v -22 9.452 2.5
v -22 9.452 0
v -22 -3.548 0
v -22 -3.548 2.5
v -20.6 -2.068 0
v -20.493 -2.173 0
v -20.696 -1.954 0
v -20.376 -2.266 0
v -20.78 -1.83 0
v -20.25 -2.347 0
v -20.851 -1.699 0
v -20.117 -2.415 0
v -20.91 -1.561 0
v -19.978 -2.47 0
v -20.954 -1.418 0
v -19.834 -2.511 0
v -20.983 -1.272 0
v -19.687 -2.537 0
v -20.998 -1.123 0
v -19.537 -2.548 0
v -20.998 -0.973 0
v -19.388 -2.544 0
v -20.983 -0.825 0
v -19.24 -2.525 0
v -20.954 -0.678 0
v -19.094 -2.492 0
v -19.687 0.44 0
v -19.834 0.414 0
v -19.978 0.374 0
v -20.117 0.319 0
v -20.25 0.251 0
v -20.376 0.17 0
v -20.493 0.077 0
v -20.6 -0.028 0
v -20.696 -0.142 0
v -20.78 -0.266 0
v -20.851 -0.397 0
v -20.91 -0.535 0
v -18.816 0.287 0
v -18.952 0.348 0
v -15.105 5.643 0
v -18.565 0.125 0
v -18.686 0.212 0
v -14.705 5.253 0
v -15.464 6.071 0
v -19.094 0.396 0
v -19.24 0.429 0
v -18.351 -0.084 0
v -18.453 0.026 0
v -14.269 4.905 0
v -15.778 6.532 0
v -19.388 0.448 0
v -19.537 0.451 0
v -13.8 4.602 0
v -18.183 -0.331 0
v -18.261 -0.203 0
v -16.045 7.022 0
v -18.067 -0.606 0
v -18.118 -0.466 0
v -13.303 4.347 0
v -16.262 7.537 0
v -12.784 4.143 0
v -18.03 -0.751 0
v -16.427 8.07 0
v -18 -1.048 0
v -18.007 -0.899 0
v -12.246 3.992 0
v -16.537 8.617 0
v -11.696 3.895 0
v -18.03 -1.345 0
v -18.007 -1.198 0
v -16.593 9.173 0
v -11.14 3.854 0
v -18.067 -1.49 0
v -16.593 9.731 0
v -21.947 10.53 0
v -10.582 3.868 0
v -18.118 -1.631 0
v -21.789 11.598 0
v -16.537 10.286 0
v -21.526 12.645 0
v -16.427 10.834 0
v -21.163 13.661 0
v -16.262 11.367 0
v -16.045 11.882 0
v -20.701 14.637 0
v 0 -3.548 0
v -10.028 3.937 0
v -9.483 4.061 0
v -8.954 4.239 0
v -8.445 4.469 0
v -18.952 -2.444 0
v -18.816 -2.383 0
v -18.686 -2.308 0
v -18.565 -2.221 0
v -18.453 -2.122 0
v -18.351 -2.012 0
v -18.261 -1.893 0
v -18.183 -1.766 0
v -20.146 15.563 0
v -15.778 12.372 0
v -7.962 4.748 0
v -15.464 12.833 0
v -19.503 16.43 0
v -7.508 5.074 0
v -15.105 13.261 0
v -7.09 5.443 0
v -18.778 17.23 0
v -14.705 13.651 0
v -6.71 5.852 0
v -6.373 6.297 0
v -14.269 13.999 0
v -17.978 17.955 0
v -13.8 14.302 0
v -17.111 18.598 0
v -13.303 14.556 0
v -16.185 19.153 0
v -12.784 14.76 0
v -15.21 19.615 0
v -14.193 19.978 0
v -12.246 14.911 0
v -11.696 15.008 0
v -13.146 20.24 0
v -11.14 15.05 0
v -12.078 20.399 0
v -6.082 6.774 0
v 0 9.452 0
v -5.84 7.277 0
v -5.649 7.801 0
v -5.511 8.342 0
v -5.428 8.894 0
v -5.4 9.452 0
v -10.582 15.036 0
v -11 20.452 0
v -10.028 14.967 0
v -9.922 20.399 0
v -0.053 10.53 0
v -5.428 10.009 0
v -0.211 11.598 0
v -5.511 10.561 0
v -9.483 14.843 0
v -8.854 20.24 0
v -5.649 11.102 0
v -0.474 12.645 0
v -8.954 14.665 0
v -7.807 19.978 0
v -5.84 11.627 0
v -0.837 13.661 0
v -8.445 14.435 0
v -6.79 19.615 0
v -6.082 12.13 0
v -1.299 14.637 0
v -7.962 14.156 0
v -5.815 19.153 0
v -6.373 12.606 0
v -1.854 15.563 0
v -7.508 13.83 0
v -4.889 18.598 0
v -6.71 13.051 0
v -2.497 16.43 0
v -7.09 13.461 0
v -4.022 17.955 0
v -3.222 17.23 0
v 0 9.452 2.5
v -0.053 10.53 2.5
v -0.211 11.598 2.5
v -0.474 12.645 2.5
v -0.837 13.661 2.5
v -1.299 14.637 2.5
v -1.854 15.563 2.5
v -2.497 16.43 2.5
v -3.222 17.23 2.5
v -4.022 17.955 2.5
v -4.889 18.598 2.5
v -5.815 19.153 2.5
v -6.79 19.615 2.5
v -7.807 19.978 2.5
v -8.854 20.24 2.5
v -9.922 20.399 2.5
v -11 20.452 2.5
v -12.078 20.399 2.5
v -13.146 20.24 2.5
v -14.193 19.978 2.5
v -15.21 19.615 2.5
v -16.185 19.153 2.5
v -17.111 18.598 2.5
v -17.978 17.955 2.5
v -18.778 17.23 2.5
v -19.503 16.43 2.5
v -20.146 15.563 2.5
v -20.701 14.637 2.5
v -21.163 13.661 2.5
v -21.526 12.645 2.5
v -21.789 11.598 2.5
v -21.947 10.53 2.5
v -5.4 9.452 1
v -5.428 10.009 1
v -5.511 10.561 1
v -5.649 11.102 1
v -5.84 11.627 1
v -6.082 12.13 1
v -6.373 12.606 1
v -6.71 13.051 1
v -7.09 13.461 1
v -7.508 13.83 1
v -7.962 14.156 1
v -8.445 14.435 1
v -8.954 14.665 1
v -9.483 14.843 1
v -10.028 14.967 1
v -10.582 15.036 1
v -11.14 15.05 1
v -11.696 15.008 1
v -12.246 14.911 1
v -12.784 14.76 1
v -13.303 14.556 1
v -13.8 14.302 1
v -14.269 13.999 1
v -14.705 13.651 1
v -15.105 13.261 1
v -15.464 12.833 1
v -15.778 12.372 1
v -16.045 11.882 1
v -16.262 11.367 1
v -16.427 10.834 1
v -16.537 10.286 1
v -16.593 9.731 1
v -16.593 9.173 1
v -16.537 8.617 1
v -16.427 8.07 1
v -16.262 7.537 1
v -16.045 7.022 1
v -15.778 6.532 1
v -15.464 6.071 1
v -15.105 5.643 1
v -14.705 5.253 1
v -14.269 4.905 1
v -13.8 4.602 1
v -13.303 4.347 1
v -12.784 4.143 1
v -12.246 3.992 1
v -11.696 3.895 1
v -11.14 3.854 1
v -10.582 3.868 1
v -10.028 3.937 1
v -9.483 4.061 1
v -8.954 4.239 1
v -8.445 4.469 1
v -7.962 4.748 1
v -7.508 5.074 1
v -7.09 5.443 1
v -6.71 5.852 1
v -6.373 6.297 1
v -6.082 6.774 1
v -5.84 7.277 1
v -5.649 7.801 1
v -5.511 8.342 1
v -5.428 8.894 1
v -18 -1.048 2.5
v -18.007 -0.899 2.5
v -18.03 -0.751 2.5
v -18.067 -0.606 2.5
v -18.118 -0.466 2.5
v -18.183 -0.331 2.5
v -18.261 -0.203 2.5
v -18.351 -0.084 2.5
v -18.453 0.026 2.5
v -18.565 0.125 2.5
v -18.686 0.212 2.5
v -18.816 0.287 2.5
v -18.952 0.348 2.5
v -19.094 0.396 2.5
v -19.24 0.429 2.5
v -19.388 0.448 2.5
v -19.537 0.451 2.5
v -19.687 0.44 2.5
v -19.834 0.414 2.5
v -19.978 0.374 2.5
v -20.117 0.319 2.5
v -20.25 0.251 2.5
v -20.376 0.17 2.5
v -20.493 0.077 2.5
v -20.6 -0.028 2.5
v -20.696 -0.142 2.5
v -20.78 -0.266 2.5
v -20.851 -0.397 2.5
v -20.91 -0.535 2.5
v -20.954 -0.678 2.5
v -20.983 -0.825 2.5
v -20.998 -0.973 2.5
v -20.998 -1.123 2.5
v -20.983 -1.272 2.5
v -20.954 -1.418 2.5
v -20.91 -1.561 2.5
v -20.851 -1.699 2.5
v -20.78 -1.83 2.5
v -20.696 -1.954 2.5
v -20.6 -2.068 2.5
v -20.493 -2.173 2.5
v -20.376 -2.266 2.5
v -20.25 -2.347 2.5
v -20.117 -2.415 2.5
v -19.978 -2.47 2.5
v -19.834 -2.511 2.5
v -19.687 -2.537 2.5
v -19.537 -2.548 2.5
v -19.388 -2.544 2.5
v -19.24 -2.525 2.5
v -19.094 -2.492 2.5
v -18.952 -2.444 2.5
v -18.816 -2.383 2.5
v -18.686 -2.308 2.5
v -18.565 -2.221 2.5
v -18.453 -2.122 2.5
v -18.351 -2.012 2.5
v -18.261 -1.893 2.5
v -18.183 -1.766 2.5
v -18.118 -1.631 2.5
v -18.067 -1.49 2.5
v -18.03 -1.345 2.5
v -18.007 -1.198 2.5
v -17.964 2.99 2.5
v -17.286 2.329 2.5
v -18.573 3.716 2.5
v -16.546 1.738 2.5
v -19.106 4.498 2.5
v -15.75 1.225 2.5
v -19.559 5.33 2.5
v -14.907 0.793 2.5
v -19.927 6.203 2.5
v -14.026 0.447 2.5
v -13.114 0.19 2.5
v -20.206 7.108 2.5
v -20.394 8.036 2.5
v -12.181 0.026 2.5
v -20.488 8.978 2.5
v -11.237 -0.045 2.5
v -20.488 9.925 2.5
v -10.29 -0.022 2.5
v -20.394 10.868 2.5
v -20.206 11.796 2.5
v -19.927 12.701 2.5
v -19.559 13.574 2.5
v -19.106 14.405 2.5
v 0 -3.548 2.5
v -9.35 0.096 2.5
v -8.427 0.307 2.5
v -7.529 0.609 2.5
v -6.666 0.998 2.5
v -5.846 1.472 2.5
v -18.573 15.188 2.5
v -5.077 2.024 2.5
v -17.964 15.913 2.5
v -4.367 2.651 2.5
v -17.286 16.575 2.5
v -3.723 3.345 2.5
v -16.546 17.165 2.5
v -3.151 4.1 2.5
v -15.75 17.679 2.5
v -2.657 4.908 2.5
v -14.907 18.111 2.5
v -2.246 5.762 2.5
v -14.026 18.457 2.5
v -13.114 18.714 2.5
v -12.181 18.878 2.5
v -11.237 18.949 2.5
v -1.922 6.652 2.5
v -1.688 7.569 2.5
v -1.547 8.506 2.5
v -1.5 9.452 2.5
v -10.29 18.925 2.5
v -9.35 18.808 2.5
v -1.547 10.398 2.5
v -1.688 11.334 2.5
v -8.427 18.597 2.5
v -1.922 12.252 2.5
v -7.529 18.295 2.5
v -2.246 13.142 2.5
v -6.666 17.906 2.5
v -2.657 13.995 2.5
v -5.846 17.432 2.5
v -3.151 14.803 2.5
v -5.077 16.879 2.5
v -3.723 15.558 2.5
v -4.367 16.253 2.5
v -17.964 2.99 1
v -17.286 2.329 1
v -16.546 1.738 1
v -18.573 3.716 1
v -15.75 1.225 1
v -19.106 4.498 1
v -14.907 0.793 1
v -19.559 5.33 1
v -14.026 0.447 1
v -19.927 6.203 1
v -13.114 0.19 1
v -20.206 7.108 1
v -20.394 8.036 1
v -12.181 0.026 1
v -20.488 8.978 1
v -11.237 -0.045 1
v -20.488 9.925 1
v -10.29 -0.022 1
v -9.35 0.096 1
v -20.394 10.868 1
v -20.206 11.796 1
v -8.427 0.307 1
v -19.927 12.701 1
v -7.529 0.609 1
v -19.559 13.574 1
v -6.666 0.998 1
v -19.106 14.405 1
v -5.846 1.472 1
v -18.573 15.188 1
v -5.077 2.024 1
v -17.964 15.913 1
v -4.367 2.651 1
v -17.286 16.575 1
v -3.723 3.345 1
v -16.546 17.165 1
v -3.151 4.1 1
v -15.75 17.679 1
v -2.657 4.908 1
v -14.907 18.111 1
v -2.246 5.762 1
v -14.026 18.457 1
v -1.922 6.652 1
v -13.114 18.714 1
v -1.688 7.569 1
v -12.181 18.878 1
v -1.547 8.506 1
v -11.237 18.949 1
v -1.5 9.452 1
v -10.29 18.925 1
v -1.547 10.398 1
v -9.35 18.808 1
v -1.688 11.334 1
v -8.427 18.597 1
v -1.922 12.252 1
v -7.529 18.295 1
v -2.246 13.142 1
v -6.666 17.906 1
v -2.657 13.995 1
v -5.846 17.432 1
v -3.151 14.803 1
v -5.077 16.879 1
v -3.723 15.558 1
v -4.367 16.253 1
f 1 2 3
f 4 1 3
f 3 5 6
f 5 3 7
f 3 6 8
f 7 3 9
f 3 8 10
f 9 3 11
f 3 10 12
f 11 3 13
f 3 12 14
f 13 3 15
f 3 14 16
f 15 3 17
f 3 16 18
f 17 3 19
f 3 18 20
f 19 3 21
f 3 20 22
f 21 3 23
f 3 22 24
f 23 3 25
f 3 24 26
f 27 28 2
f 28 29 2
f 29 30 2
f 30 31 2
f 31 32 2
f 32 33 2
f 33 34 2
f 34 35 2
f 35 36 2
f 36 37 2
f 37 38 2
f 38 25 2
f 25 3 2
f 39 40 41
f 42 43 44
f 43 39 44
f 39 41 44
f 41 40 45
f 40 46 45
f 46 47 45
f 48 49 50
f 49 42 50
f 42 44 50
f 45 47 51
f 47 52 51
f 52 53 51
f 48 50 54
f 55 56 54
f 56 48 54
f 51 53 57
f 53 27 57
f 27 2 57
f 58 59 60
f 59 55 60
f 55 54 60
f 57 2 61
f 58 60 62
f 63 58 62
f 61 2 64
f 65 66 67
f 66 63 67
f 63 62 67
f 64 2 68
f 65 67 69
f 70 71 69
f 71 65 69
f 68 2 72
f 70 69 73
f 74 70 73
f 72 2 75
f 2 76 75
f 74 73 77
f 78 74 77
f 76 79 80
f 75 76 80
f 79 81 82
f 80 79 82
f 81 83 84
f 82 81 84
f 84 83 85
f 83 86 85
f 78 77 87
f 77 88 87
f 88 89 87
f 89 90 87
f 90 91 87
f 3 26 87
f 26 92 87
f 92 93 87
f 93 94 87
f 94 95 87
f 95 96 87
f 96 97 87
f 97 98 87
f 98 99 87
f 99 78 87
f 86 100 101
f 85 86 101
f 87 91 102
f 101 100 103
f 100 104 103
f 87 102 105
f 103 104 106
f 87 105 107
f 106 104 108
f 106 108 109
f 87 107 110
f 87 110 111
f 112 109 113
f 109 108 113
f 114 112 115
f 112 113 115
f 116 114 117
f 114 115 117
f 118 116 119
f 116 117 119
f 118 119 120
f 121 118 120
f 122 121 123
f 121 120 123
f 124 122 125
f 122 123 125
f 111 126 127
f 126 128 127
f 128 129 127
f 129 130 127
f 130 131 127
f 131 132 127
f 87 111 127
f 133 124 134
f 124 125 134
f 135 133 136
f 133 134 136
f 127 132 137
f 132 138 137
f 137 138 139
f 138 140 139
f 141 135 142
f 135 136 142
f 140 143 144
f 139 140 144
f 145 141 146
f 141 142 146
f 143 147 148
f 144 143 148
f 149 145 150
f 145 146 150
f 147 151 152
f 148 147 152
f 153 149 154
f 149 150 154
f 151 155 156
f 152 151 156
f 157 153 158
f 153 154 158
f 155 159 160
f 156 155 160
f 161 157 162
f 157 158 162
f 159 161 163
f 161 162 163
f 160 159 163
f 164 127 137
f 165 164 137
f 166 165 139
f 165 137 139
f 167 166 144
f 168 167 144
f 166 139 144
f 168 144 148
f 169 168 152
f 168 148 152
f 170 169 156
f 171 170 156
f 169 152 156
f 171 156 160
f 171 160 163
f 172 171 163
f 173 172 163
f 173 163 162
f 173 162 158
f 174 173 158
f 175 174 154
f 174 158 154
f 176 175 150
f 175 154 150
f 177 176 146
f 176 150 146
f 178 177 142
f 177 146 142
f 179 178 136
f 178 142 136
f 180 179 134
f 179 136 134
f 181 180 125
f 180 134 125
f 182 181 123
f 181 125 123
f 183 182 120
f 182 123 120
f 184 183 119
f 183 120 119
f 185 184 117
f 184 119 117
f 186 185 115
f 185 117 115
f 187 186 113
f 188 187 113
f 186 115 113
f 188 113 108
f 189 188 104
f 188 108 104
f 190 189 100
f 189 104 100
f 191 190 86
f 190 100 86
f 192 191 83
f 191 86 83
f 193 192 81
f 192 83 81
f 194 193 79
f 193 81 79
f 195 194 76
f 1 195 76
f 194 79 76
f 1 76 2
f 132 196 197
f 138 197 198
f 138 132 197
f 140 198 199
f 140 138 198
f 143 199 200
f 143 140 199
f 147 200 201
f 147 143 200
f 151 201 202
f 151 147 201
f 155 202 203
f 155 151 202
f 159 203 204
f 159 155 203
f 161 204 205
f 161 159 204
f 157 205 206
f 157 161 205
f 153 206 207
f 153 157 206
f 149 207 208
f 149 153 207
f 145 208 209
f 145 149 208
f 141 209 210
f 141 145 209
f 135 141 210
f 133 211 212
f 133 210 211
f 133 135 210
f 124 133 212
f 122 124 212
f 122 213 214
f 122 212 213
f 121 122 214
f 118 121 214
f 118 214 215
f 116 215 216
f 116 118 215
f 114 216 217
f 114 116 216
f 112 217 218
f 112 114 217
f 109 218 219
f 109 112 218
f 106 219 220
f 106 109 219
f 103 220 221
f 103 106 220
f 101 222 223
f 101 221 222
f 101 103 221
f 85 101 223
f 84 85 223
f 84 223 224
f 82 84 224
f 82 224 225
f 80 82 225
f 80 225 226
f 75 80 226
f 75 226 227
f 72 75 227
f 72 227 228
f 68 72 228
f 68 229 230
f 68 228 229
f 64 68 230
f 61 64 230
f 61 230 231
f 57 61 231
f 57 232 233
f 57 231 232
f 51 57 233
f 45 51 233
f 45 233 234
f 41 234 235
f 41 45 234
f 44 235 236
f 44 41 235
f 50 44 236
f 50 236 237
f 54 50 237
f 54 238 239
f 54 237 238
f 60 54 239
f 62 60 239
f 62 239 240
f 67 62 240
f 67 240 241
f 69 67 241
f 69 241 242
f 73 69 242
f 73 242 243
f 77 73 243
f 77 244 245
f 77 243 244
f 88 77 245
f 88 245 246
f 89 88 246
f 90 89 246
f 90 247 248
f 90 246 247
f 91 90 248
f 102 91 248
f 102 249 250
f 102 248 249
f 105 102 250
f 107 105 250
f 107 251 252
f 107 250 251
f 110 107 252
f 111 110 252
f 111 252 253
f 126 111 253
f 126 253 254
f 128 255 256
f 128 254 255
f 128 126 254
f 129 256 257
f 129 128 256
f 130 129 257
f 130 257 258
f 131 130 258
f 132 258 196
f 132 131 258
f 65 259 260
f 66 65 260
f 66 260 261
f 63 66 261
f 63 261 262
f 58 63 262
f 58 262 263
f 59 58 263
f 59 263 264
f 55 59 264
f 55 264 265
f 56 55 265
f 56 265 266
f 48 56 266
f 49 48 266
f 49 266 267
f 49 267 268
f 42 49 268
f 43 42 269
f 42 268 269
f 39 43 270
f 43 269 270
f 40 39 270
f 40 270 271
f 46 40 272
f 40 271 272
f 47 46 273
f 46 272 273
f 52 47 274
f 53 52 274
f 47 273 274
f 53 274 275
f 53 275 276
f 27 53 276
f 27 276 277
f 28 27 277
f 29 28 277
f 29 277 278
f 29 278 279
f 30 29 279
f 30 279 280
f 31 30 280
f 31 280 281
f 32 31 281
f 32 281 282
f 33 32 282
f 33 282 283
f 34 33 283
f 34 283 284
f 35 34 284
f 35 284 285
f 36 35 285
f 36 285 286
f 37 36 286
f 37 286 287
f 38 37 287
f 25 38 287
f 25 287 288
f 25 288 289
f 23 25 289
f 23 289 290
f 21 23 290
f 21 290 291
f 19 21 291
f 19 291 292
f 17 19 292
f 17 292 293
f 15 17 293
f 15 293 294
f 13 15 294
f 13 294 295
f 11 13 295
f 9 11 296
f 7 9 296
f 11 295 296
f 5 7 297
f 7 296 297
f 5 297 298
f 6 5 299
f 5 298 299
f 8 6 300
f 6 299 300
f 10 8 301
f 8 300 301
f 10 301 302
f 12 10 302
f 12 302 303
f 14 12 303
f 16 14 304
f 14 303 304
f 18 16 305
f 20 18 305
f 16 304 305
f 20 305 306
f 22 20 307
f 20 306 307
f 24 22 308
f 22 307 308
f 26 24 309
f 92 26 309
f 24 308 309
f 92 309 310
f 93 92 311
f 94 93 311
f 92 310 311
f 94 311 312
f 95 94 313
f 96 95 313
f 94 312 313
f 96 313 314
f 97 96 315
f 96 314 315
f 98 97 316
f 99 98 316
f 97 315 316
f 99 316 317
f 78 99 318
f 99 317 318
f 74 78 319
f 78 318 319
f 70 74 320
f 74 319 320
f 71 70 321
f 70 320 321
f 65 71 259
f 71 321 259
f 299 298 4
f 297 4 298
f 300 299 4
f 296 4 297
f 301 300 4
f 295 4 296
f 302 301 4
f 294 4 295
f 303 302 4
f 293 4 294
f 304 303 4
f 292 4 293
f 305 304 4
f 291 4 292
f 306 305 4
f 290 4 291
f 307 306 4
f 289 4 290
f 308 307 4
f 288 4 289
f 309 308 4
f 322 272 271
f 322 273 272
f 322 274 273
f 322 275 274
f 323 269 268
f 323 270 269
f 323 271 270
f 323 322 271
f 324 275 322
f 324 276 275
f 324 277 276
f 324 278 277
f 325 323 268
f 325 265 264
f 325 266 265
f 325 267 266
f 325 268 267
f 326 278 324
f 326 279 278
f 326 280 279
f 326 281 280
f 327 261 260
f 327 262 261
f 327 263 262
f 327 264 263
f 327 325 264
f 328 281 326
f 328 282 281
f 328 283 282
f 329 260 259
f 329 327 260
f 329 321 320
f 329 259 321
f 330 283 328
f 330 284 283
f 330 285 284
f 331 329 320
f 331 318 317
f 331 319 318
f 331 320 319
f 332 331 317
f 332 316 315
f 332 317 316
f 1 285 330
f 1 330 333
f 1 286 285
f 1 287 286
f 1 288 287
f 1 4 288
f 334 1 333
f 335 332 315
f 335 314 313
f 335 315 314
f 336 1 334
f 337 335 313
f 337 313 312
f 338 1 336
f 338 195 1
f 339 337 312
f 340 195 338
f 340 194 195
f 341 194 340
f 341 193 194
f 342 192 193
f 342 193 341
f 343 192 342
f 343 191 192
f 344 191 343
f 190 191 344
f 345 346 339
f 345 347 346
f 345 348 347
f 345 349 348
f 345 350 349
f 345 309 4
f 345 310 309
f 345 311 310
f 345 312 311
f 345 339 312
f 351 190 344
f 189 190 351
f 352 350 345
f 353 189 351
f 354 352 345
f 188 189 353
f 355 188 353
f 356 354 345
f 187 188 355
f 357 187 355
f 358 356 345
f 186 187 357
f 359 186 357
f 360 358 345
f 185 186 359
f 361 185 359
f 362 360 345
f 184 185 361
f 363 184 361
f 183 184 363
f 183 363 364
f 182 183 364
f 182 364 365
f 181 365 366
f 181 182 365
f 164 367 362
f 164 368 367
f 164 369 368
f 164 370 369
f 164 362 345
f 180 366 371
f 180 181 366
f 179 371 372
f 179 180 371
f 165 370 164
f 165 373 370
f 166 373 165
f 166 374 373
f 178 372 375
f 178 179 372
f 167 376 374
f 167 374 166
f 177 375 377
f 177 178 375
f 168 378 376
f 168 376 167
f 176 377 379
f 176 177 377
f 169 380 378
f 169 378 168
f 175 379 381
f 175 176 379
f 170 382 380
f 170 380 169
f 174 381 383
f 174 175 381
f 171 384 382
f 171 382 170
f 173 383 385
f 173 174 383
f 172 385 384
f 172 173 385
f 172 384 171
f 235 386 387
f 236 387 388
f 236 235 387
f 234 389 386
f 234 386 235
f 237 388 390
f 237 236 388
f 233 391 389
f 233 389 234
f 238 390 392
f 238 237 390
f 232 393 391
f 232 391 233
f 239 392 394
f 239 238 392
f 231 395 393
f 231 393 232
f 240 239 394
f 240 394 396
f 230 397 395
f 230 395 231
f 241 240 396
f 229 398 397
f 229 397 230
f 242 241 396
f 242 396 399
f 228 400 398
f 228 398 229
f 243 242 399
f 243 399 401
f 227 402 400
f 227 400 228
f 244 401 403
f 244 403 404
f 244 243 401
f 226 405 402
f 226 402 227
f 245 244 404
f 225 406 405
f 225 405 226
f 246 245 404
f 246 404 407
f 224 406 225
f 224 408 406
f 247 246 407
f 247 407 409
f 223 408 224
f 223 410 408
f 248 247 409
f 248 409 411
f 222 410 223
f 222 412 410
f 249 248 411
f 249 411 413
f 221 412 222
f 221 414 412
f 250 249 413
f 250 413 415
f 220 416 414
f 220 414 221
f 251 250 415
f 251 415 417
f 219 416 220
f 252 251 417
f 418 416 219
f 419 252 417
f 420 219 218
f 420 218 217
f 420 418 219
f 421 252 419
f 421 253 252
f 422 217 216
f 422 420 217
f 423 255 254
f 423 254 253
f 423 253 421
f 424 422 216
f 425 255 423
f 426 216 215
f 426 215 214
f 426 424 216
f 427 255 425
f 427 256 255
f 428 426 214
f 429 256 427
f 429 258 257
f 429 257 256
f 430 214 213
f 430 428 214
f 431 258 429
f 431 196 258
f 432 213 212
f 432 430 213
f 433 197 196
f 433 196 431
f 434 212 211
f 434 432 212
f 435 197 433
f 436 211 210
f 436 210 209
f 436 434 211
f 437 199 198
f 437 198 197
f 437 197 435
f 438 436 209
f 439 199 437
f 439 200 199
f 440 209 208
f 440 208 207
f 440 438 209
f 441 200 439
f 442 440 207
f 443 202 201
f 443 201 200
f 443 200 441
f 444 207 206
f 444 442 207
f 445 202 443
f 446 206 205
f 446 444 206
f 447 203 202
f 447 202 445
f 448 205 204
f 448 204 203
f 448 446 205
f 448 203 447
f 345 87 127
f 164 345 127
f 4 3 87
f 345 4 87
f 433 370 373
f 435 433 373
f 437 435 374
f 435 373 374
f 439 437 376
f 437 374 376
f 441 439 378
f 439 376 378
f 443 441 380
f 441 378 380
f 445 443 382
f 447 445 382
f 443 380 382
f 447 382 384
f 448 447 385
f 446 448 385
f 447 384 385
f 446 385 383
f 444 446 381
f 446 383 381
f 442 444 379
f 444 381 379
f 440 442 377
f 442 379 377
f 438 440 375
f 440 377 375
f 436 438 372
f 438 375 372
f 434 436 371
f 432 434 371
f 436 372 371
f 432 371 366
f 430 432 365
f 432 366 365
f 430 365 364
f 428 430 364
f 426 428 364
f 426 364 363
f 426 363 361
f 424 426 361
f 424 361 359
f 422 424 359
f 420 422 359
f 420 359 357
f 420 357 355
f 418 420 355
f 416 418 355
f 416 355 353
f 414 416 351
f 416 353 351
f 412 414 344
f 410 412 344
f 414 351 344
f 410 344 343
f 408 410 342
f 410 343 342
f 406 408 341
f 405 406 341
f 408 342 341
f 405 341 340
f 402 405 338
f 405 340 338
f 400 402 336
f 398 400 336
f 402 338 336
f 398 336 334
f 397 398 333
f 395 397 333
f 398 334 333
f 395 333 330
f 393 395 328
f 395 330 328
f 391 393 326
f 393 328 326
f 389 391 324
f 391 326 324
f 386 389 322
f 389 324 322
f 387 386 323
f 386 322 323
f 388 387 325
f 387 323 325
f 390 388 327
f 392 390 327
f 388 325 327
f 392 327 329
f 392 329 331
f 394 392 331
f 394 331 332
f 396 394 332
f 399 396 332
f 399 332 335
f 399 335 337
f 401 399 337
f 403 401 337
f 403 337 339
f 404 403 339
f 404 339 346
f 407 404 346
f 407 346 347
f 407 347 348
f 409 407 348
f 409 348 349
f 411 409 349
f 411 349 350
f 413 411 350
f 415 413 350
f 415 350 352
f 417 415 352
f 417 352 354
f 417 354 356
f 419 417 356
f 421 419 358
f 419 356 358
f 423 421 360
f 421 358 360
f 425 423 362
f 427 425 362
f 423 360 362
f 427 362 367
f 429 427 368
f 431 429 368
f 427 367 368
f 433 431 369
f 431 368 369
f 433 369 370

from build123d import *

# Parameters (mm, degrees)
ESQUISSE1_R      = 5.6
EXTRUSION1_DEPTH = 2.5
ESQUISSE2_R      = 9.5
EXTRUSION2_DEPTH = 1.5
ESQUISSE3_R      = 1.5
EXTRUSION3_DEPTH = 31.141796481


with BuildPart() as part:
    # Esquisse1 → Extrusion1 (new body)
    with BuildSketch(Plane.XY):
        with BuildLine():
            Line((-22, 9.451843318), (-22, -3.548156682))
            Line((-22, -3.548156682), (0, -3.548156682))
            Line((0, -3.548156682), (0, 9.451843318))
            ThreePointArc((0, 9.451843318), (-11, 20.451843318), (-22, 9.451843318))
        make_face()
        with Locations((-11, 9.451843318)):
            Circle(ESQUISSE1_R, mode=Mode.SUBTRACT)
    extrude(amount=EXTRUSION1_DEPTH)

    # Esquisse2 → Extrusion2 (cut)
    with BuildSketch(Plane.XY.offset(2.5)):
        with Locations((-11, 9.451843318)):
            Circle(ESQUISSE2_R)
    extrude(amount=-EXTRUSION2_DEPTH, mode=Mode.SUBTRACT)

    # Esquisse3 → Extrusion3 (cut, through all)
    with BuildSketch(Plane.XY.offset(2.5)):
        with Locations((-19.5, -1.048156682)):
            Circle(ESQUISSE3_R)
    extrude(amount=-EXTRUSION3_DEPTH, mode=Mode.SUBTRACT)


solid = part.part
